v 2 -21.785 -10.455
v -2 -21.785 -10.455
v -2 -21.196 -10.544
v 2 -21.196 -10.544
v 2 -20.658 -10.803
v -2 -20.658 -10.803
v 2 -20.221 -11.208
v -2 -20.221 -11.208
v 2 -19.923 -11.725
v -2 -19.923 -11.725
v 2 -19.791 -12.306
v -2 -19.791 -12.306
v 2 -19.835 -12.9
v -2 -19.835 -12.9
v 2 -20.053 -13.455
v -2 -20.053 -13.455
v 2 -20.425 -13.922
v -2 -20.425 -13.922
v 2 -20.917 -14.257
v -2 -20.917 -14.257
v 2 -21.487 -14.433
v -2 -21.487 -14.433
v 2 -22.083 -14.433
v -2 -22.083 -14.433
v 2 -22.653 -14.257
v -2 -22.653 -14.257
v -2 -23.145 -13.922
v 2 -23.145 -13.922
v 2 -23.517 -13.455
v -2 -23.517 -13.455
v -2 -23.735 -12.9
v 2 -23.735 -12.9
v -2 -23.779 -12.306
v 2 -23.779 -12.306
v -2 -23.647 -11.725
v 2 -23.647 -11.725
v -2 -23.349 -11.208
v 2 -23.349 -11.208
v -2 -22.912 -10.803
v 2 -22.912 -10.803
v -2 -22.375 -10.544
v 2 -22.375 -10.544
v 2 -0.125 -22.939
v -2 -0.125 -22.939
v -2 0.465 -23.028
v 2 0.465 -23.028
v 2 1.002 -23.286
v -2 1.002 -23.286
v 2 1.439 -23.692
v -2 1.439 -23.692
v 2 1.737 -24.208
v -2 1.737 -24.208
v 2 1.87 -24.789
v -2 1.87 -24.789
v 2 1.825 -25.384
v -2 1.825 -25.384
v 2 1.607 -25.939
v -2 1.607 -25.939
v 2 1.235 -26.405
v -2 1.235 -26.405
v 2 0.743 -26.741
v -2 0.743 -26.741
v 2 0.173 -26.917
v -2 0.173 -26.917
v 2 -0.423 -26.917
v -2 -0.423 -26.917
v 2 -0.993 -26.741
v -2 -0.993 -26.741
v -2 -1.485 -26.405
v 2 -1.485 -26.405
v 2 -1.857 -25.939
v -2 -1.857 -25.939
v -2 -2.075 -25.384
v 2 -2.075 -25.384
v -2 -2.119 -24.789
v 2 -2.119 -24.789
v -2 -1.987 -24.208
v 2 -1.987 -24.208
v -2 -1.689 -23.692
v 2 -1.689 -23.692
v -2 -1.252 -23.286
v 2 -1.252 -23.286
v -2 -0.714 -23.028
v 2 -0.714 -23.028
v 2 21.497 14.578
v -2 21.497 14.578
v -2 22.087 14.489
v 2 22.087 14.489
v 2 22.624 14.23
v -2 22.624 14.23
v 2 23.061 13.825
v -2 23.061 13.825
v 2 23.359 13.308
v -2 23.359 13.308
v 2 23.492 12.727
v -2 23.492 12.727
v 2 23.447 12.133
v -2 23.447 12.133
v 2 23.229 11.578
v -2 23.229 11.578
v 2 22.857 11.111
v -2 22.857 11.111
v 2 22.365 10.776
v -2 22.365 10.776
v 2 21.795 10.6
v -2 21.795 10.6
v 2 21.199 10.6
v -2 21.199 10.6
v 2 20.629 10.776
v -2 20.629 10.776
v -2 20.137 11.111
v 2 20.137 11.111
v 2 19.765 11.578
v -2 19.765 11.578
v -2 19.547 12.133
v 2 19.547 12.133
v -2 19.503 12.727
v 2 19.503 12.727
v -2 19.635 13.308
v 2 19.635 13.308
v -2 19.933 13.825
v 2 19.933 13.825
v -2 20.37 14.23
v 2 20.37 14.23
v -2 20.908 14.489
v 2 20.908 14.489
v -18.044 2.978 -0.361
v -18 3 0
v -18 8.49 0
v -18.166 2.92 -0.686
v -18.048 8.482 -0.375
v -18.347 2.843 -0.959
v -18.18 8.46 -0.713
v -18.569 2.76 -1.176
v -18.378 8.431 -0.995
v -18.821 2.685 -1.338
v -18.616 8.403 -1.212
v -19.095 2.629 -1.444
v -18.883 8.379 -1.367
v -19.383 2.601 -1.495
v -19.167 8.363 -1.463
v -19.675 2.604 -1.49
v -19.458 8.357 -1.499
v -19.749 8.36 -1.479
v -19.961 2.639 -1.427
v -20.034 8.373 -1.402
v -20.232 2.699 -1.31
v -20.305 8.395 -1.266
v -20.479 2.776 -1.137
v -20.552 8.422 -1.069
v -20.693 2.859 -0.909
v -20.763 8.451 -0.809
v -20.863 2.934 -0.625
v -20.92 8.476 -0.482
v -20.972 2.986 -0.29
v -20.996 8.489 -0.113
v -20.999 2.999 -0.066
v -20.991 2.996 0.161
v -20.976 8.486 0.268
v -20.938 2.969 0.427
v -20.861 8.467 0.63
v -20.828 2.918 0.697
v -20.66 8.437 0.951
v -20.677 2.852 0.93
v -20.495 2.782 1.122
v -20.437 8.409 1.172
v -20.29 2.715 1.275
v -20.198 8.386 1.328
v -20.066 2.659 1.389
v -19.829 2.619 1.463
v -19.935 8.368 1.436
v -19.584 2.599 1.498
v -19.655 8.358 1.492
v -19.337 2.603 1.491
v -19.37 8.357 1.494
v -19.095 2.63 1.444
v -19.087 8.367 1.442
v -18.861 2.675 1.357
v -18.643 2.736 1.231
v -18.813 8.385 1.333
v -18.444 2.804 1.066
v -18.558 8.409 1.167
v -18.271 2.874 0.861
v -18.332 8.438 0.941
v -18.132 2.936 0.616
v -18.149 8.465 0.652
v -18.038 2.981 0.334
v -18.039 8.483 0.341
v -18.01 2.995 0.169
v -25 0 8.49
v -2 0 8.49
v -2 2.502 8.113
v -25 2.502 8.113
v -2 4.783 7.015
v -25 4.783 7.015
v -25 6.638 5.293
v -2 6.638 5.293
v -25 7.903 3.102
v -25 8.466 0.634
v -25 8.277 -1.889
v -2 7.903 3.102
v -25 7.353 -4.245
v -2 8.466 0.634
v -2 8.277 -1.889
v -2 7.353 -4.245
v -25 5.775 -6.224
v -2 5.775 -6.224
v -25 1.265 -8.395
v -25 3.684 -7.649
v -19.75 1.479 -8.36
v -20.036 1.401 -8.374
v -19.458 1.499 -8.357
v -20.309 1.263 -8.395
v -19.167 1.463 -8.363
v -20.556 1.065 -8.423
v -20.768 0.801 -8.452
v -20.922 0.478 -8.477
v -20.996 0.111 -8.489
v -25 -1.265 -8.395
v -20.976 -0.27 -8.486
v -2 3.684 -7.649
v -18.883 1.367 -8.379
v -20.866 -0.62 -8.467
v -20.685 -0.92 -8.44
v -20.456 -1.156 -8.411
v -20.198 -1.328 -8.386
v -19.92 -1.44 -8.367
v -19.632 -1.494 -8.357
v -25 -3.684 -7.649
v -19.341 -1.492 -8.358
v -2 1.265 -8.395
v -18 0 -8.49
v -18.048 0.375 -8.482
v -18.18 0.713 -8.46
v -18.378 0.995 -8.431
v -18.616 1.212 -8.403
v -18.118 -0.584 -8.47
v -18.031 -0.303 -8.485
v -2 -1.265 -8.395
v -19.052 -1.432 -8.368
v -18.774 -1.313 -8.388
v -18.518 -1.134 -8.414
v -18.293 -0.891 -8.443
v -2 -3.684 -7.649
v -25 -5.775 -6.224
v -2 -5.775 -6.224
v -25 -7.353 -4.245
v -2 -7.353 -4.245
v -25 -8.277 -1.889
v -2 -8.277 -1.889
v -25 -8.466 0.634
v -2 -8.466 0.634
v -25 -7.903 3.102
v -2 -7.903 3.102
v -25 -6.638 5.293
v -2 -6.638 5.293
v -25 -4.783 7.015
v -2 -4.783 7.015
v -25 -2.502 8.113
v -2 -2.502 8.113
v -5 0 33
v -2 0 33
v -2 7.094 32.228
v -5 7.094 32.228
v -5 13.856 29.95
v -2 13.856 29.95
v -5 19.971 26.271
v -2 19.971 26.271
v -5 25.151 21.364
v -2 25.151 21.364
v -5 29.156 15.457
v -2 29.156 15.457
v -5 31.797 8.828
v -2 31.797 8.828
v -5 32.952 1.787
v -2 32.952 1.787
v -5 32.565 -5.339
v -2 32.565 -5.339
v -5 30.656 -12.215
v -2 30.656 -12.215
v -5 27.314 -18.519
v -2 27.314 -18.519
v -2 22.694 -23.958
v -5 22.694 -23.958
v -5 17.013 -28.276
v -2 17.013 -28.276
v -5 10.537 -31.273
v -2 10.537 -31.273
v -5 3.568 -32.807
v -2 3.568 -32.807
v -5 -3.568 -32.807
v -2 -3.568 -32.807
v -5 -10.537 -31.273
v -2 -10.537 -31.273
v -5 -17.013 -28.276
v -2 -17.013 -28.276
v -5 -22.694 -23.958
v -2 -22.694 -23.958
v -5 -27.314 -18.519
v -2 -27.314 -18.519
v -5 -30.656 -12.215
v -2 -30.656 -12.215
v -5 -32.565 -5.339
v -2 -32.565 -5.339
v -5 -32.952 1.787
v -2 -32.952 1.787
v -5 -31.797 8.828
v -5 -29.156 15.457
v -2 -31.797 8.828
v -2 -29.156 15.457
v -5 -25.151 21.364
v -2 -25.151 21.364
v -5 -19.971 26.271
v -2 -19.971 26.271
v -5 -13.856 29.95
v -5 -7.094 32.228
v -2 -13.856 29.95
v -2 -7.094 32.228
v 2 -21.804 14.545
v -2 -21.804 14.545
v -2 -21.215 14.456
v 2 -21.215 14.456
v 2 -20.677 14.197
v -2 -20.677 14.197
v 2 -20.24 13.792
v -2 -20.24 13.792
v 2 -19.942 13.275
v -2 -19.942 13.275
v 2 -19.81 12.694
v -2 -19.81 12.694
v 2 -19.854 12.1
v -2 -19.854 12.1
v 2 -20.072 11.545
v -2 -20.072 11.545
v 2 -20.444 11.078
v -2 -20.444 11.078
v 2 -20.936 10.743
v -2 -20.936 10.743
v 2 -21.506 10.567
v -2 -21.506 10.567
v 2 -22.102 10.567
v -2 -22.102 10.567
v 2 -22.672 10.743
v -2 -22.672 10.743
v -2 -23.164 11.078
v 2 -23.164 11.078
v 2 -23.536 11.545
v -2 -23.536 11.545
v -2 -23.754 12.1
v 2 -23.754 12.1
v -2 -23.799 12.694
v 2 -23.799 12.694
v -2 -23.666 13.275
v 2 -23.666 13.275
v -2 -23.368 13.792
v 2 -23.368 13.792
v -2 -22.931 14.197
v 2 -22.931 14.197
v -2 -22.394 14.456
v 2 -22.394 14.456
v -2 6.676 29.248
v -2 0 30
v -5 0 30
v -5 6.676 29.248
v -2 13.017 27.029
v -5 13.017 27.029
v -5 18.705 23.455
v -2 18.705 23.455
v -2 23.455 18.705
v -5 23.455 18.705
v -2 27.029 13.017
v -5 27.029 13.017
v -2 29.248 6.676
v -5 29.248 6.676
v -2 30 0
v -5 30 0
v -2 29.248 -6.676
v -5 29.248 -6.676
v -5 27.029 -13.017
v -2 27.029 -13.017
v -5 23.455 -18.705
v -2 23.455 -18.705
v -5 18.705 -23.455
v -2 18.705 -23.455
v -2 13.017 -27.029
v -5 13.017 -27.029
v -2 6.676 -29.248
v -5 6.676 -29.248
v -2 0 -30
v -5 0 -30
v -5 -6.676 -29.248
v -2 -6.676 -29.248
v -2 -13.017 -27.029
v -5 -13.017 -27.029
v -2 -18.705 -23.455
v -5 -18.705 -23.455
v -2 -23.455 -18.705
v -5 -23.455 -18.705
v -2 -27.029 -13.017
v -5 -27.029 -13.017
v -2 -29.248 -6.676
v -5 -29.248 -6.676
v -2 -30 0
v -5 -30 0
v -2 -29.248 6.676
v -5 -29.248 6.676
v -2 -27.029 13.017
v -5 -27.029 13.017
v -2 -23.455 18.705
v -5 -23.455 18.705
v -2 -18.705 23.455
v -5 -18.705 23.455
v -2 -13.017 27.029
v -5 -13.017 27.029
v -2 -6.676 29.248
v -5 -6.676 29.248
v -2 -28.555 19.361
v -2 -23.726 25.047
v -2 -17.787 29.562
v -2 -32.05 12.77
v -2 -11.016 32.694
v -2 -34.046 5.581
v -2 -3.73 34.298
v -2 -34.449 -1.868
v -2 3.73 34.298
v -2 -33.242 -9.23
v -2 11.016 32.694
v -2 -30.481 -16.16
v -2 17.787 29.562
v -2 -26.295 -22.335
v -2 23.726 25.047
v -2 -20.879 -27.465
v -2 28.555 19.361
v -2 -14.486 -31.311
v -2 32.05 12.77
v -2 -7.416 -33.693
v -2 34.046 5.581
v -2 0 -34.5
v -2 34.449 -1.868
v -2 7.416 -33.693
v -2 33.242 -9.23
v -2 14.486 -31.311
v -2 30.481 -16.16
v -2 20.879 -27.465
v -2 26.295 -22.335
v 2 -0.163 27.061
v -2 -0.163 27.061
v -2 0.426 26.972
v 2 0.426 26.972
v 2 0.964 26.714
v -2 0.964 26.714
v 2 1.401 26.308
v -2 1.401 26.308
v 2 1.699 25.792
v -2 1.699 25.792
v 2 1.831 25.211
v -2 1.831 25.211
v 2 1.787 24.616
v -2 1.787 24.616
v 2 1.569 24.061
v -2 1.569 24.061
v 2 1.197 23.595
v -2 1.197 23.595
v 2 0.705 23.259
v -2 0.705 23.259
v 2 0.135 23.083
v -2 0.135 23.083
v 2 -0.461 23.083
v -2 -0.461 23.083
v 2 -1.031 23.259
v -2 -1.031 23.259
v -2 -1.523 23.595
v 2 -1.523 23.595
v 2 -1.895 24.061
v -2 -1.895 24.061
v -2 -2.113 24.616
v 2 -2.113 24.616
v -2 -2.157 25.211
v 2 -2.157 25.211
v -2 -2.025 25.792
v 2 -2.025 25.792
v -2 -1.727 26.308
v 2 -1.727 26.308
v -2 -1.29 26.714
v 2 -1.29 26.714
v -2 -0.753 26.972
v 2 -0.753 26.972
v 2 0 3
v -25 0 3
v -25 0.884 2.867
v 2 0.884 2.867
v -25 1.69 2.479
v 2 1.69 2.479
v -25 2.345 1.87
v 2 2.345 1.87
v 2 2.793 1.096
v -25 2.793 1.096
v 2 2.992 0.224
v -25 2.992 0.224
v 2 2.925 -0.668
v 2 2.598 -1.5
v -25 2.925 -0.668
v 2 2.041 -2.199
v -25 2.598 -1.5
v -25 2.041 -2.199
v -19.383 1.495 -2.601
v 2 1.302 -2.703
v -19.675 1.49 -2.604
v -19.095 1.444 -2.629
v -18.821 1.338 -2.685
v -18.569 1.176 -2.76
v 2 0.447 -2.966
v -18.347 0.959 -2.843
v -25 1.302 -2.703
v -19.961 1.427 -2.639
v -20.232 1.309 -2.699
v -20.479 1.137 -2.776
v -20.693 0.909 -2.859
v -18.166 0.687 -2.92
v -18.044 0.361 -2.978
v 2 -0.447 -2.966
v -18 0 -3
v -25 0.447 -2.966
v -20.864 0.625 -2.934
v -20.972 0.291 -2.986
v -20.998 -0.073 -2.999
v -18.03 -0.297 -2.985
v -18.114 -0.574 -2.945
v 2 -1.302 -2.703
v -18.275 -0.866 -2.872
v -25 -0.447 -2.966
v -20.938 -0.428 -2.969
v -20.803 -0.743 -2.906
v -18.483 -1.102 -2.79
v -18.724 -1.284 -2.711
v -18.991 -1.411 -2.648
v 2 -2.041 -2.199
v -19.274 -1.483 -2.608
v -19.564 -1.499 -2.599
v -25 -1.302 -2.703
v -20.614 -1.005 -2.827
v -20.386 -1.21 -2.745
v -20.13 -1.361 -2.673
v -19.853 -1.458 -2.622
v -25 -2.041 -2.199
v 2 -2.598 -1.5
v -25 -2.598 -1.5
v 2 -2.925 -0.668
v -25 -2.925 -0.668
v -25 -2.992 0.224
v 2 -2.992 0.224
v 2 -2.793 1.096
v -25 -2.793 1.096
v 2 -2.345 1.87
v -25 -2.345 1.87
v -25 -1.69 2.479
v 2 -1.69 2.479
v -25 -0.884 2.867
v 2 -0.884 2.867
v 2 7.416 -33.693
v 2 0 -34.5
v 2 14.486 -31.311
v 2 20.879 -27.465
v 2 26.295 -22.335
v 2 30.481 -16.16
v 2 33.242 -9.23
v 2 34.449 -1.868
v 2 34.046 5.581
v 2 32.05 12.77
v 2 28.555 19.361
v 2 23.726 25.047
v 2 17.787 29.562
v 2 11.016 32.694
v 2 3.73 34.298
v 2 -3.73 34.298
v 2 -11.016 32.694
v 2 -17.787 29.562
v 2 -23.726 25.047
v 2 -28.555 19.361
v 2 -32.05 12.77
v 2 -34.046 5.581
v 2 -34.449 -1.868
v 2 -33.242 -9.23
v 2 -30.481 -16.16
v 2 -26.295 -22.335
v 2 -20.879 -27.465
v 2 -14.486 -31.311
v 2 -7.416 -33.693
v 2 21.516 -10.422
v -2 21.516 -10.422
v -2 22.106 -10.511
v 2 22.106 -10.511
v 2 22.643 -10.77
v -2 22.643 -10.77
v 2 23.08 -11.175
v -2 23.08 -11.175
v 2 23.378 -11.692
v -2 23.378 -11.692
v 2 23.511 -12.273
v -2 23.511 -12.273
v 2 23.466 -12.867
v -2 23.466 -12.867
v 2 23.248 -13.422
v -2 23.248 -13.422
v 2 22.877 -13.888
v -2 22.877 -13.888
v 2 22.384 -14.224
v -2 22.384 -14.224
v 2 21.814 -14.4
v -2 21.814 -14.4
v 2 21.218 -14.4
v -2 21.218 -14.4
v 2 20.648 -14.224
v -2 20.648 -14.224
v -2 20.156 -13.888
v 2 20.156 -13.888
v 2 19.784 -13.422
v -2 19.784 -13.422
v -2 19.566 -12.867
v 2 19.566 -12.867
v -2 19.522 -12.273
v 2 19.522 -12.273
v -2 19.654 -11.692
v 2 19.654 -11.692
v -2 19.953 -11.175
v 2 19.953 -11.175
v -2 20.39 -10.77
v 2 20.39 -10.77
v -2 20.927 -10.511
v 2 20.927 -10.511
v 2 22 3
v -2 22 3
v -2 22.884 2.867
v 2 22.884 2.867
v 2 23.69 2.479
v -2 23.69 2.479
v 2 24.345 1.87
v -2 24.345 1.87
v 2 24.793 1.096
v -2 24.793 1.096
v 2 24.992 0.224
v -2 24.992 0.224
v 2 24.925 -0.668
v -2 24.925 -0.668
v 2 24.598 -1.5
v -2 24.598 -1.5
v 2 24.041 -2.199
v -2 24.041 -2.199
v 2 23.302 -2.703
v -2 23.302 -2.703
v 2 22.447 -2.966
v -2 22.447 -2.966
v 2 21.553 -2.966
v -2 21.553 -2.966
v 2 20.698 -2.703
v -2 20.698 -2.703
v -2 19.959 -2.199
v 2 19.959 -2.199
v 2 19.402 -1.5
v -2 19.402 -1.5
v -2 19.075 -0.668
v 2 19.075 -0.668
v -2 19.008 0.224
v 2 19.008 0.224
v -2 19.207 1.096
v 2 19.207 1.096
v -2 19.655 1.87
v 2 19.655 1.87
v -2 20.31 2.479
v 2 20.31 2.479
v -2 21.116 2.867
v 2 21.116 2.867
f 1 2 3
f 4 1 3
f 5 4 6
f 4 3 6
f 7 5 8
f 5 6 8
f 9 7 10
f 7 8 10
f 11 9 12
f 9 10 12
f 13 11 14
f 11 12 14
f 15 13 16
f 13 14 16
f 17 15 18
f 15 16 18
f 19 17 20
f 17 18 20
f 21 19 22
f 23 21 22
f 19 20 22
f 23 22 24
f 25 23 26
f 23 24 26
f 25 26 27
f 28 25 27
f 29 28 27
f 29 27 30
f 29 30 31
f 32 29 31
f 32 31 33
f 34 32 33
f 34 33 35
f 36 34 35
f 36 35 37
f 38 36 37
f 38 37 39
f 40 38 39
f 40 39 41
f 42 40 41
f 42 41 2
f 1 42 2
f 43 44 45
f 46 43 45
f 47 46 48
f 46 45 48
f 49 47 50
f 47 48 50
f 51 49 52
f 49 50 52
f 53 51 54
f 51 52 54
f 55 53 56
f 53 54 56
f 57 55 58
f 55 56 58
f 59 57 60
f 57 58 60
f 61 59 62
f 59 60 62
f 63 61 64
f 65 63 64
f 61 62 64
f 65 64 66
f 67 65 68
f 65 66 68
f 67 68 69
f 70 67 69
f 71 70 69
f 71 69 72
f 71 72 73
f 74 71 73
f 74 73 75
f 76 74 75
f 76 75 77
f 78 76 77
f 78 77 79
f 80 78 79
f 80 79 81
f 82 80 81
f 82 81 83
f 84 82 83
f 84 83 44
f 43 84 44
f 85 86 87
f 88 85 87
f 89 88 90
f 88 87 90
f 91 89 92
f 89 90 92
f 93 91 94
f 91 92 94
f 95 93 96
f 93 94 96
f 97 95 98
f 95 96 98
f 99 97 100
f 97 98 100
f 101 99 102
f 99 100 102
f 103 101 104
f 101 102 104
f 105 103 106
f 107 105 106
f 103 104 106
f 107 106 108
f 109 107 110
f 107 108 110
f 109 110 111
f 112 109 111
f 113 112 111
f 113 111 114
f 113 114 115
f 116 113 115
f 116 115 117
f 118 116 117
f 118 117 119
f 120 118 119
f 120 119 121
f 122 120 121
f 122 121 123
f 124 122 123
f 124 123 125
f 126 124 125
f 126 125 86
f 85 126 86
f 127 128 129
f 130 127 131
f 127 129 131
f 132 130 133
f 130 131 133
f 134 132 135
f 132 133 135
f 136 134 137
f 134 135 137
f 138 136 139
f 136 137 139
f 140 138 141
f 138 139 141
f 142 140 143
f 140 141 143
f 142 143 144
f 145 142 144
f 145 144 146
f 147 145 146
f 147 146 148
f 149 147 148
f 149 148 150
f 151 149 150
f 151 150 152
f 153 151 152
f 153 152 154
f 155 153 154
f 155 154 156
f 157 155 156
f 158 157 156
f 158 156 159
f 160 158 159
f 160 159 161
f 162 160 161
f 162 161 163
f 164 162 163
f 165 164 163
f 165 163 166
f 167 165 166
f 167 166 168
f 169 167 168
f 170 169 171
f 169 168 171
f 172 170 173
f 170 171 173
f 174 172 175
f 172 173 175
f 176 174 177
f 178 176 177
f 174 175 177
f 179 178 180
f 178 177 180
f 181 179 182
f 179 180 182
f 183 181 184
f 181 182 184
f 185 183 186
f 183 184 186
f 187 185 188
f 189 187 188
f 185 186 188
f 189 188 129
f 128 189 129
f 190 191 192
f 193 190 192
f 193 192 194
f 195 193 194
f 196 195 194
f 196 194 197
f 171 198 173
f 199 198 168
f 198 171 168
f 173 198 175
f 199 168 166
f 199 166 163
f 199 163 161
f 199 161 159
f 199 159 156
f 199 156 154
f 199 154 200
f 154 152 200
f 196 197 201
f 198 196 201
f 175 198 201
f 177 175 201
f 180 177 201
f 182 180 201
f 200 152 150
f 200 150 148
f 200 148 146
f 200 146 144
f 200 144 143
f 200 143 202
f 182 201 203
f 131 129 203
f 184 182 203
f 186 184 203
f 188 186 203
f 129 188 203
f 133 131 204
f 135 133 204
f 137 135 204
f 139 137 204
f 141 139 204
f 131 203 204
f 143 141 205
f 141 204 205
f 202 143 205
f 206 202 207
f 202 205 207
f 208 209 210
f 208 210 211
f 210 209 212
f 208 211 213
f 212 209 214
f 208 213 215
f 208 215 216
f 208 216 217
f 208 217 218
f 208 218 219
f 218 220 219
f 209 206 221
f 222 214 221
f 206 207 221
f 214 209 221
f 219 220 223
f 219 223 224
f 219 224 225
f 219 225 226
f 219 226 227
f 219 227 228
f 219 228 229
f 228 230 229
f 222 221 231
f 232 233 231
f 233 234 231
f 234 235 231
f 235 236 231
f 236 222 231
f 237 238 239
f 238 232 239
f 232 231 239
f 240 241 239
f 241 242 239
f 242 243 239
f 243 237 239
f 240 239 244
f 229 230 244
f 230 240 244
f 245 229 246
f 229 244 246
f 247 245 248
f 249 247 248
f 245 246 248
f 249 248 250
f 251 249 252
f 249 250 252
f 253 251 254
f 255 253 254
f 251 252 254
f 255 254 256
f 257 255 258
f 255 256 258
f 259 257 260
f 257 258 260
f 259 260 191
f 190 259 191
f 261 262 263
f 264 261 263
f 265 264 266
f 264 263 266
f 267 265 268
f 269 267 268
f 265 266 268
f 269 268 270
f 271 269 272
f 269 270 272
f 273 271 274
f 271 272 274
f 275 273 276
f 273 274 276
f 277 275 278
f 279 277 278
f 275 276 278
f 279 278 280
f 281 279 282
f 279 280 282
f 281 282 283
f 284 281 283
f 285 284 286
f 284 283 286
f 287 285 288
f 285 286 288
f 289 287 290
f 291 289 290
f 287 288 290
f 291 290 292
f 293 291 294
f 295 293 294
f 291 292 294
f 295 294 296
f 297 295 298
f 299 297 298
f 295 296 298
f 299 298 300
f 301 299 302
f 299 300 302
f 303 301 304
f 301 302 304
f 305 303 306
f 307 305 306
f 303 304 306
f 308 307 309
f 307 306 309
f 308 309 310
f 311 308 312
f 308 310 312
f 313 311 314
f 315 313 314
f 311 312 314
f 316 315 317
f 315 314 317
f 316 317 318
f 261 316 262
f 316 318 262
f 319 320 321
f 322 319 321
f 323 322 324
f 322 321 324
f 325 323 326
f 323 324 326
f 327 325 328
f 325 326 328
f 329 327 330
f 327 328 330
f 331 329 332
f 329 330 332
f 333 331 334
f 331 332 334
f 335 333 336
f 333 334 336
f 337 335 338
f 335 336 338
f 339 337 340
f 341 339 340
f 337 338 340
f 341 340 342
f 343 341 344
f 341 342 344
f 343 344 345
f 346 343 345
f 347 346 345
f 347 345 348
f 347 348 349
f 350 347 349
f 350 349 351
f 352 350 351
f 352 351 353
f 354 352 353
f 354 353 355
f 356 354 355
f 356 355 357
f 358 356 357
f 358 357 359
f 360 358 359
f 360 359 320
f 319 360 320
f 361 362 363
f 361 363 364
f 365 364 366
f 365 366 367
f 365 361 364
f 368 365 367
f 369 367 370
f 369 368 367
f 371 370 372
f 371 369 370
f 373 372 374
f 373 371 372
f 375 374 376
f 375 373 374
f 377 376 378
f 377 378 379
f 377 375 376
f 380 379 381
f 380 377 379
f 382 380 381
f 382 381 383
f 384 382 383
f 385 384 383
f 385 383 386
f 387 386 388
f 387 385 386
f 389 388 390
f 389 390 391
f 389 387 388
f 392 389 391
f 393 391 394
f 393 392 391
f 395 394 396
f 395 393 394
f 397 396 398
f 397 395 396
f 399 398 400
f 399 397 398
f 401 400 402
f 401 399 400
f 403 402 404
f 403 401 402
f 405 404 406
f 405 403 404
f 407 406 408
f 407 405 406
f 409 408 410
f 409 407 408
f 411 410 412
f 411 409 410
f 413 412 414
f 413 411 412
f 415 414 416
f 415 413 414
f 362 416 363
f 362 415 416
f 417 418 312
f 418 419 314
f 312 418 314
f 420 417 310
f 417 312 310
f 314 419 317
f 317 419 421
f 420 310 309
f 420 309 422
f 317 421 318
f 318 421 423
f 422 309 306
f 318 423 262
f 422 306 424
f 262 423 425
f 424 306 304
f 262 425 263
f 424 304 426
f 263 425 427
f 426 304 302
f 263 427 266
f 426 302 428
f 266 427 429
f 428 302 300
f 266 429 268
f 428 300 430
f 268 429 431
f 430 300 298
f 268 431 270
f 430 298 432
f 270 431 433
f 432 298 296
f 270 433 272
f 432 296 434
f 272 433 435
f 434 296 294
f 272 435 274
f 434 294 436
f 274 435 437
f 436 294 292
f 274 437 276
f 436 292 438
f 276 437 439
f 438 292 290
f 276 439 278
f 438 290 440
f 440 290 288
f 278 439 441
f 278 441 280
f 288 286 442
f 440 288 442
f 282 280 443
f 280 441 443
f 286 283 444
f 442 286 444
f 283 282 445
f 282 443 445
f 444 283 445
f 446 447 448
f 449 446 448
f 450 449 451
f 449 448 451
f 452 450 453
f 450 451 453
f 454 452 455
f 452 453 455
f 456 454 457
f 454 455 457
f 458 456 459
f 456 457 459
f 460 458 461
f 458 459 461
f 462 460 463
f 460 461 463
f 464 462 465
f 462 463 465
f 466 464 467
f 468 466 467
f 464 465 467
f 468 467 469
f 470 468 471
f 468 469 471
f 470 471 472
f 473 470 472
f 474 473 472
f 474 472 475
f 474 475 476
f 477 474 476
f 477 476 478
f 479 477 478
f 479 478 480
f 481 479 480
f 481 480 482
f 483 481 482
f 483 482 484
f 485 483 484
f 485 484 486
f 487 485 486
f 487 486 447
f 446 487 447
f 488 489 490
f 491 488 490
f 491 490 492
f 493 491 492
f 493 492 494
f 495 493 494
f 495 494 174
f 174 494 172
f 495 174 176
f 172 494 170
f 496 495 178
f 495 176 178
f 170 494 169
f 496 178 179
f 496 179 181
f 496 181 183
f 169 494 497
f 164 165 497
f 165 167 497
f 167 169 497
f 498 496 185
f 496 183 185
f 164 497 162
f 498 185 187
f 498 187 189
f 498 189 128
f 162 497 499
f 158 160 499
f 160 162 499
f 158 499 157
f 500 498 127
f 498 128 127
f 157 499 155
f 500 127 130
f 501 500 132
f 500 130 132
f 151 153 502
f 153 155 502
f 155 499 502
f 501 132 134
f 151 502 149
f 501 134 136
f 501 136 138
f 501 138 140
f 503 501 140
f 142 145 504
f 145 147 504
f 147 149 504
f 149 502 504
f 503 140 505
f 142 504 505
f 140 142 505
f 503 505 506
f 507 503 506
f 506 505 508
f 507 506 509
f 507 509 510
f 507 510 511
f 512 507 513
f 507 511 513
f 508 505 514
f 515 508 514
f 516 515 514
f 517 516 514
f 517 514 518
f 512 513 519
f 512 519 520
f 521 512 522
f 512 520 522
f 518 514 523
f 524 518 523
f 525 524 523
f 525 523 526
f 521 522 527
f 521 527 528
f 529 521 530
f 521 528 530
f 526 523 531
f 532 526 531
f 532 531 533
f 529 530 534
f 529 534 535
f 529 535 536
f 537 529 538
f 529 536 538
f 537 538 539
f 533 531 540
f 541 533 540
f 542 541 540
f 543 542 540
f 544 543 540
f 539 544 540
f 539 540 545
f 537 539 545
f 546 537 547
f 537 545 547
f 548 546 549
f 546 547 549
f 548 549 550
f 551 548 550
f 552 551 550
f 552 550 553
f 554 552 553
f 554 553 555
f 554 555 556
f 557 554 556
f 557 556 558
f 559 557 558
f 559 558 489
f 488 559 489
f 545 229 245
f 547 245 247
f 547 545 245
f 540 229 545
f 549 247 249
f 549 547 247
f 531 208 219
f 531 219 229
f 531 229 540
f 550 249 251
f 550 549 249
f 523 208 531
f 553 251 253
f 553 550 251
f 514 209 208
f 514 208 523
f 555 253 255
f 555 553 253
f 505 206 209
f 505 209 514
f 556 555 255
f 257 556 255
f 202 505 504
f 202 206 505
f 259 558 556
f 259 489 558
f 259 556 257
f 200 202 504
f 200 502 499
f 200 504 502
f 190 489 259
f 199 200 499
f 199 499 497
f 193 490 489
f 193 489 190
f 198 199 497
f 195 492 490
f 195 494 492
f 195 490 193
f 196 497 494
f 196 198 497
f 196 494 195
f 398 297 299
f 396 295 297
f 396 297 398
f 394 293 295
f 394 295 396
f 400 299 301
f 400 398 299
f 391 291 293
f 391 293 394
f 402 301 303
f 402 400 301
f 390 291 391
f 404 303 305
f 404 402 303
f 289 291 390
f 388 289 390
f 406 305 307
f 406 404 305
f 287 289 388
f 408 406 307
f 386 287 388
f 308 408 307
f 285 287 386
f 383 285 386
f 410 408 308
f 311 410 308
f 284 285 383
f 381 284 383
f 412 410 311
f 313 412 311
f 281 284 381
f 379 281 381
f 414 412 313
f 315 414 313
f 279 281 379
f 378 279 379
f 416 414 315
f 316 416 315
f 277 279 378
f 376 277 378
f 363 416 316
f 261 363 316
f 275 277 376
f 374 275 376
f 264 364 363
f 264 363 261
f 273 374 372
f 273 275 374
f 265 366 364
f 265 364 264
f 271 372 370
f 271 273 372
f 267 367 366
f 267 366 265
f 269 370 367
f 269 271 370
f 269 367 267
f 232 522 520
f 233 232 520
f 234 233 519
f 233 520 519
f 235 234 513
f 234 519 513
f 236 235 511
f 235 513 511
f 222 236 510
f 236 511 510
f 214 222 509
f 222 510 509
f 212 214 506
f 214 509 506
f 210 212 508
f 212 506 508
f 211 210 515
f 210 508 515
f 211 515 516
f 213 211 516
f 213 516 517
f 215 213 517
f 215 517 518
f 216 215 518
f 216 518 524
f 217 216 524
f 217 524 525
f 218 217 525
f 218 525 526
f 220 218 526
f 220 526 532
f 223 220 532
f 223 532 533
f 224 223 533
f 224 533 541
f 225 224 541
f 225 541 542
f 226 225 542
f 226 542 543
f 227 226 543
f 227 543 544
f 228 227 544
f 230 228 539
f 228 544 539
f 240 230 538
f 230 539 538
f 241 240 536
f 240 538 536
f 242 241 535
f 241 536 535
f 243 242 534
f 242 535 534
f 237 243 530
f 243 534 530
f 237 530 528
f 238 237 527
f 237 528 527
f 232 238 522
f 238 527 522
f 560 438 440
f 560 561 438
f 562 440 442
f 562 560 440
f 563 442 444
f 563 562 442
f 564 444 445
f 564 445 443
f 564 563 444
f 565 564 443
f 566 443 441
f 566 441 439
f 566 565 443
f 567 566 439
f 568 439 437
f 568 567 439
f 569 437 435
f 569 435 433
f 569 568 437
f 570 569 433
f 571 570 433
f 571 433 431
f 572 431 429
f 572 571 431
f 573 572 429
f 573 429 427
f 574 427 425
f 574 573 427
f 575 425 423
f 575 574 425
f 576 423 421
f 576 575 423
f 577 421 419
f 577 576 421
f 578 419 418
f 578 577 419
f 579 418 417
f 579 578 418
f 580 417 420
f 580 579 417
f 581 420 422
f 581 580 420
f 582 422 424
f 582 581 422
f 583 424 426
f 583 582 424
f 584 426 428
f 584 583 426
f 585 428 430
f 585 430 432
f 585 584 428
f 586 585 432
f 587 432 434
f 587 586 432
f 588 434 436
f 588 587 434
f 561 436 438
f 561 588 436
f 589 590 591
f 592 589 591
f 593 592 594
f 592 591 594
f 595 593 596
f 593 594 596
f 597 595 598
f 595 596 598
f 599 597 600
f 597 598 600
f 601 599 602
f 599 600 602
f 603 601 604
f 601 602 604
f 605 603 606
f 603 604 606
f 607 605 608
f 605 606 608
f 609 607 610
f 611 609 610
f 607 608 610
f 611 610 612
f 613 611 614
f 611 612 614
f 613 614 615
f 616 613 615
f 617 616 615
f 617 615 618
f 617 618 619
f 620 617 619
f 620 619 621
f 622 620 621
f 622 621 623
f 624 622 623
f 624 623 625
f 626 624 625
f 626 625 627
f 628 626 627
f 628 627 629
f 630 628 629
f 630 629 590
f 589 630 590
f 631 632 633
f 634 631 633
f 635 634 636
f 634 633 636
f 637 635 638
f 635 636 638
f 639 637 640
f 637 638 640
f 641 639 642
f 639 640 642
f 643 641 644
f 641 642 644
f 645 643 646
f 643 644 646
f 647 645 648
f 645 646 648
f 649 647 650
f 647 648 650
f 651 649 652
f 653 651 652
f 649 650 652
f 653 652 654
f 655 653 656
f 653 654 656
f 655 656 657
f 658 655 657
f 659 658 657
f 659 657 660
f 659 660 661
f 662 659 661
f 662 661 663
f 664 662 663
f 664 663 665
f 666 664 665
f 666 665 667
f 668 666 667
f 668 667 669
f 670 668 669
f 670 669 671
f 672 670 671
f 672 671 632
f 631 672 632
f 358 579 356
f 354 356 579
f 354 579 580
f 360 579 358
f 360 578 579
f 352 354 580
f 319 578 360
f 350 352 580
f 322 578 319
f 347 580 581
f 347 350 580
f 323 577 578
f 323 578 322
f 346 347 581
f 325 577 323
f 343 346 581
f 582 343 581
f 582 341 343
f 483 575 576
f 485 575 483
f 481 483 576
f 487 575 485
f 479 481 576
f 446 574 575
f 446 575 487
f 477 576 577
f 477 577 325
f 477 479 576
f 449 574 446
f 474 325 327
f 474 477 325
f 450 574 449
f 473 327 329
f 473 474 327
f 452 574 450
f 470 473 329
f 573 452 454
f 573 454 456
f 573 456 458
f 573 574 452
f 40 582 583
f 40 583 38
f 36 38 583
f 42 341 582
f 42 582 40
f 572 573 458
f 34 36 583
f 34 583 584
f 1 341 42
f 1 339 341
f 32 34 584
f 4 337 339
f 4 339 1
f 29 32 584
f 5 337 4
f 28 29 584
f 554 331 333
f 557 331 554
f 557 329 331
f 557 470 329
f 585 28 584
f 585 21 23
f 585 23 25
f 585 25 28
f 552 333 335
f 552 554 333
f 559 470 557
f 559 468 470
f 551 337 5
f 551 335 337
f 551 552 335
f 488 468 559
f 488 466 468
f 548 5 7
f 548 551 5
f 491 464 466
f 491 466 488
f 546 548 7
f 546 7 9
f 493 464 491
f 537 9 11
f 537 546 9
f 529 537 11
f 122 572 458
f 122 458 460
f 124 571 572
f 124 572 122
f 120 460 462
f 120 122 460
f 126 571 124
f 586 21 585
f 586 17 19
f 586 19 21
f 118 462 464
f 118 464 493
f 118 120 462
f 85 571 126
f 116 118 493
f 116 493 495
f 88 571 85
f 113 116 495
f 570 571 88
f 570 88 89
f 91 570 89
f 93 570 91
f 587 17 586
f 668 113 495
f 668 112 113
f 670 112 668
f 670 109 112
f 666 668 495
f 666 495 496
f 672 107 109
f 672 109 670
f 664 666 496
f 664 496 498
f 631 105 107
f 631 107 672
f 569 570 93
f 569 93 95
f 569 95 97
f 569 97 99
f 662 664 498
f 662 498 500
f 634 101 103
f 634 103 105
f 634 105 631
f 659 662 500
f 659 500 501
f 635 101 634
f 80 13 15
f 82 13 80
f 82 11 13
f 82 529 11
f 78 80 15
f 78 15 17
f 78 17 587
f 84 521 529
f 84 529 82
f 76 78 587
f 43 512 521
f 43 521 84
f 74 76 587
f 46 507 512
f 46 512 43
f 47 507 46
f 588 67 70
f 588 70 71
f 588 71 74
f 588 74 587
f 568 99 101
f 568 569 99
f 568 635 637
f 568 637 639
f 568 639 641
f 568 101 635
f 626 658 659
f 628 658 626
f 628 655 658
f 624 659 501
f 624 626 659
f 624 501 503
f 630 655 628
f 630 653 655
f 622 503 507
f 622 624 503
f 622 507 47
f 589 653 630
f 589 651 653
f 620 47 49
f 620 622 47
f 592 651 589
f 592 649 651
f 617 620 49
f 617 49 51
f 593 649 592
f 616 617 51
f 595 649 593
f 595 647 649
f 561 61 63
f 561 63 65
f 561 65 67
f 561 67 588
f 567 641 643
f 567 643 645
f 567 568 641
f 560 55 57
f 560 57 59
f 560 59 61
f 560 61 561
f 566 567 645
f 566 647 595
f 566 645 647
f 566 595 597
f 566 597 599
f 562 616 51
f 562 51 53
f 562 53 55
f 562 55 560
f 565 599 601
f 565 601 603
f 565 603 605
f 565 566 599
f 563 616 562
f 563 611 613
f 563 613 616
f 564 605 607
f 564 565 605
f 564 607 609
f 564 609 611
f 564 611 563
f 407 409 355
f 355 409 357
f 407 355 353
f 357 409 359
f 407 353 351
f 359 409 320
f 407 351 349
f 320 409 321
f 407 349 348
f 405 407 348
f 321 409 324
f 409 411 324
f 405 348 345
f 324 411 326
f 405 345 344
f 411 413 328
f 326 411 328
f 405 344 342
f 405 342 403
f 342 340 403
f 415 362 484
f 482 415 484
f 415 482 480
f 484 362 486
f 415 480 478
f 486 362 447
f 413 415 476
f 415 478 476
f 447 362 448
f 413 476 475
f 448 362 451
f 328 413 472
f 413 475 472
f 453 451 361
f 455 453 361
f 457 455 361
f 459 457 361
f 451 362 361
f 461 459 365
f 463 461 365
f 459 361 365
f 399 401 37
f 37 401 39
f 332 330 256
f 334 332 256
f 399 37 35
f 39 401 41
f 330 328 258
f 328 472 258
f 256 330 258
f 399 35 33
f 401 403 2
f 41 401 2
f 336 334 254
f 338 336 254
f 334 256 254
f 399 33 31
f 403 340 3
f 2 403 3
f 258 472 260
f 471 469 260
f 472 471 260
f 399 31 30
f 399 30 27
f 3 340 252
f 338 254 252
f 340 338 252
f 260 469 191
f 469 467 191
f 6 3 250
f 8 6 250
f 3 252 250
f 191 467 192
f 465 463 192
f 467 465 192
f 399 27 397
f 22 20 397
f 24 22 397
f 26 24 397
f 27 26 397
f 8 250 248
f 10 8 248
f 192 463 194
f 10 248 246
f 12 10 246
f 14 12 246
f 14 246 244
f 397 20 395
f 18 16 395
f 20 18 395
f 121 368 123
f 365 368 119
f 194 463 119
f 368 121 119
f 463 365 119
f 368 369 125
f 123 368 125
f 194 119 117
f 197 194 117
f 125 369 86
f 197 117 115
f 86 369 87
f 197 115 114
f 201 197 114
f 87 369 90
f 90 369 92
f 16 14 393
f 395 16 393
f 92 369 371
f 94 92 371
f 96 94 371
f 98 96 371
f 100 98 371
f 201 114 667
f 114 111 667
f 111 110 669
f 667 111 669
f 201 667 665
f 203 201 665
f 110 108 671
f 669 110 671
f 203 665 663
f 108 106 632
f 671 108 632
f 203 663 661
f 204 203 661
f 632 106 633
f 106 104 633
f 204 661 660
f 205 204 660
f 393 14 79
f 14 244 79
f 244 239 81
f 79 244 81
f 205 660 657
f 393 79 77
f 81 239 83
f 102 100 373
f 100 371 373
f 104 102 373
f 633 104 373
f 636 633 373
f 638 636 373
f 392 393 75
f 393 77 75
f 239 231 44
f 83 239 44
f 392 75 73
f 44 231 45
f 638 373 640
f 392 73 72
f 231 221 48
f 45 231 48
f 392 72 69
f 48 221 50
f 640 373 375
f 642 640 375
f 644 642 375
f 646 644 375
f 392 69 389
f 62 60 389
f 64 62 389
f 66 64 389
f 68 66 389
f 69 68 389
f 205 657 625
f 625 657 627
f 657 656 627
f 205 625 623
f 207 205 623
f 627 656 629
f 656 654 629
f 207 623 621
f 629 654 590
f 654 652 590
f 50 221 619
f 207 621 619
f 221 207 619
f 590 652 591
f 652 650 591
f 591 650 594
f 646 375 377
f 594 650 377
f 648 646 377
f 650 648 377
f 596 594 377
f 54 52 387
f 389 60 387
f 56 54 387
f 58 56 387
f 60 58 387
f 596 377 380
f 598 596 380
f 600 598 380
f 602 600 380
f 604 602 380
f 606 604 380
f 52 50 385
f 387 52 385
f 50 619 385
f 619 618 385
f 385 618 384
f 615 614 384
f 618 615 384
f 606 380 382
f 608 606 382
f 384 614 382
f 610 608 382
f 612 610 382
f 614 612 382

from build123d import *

# Parameters (mm, degrees)
SKETCH1_R           = 34.5
BOSS_EXTRUDE1_DEPTH = 2
SKETCH2_R           = 8.49
BOSS_EXTRUDE2_DEPTH = 23
SKETCH4_R           = 3
CUT_EXTRUDE1_DEPTH  = 30
CUT_EXTRUDE2_REACH  = 45
SKETCH5_R           = 1.5
CUT_EXTRUDE3_REACH  = 36.5
SKETCH6_R           = 1.5
SKETCH19_R          = 33
SKETCH19_R_2        = 30
BOSS_EXTRUDE5_DEPTH = 3
SKETCH21_R          = 3
CUT_EXTRUDE6_DEPTH  = 10
SKETCH20_R          = 2
CUT_EXTRUDE7_DEPTH  = 10


with BuildPart() as part:
    # Sketch1 → Boss-Extrude1 (new body, symmetric)
    with BuildSketch(Plane(origin=(0, 0, 0), x_dir=(0, 0, -1), z_dir=(1, 0, 0))):
        Circle(SKETCH1_R)
    extrude(amount=BOSS_EXTRUDE1_DEPTH, both=True)

    # Sketch2 → Boss-Extrude2 (add)
    with BuildSketch(Plane.ZY.offset(2)):
        Circle(SKETCH2_R)
    extrude(amount=BOSS_EXTRUDE2_DEPTH)

    # Sketch4 → Cut-Extrude1 (cut)
    with BuildSketch(Plane.ZY.offset(25)):
        Circle(SKETCH4_R)
    extrude(amount=-CUT_EXTRUDE1_DEPTH, mode=Mode.SUBTRACT)

    # Sketch5 → Cut-Extrude2 (cut, up to next)
    with BuildSketch(Plane(origin=(0, 8.5, 0), x_dir=(1, 0, 0), z_dir=(0, 1, 0)), mode=Mode.PRIVATE) as cut_extrude2_sk1:
        with Locations((-19.5, 0)):
            Circle(SKETCH5_R)
    cut_extrude2_tool1 = extrude(cut_extrude2_sk1.sketch, amount=-CUT_EXTRUDE2_REACH, mode=Mode.PRIVATE) & part.part
    add(cut_extrude2_tool1.solids().sort_by_distance((-19.5, 8.5, 0))[0], mode=Mode.SUBTRACT)

    # Sketch6 → Cut-Extrude3 (cut, up to next)
    with BuildSketch(Plane.XY, mode=Mode.PRIVATE) as cut_extrude3_sk1:
        with Locations((-19.5, 0)):
            Circle(SKETCH6_R)
    cut_extrude3_tool1 = extrude(cut_extrude3_sk1.sketch, amount=-CUT_EXTRUDE3_REACH, mode=Mode.PRIVATE) & part.part
    add(cut_extrude3_tool1.solids().sort_by_distance((-19.5, 0, 0))[0], mode=Mode.SUBTRACT)

    # Sketch19 → Boss-Extrude5 (add)
    with BuildSketch(Plane.ZY.offset(2)):
        Circle(SKETCH19_R)
        Circle(SKETCH19_R_2, mode=Mode.SUBTRACT)
    extrude(amount=BOSS_EXTRUDE5_DEPTH)

    # Sketch21 → Cut-Extrude6 (cut)
    with BuildSketch(Plane.ZY.offset(2)):
        with Locations((0, 22)):
            Circle(SKETCH21_R)
    extrude(amount=-CUT_EXTRUDE6_DEPTH, mode=Mode.SUBTRACT)

    # Sketch20 → Cut-Extrude7 (cut)
    with BuildSketch(Plane.ZY.offset(2)):
        with Locations((-12.422389037, 21.516208963)):
            Circle(SKETCH20_R)
        with Locations((12.577603677, 21.497122149)):
            Circle(SKETCH20_R)
        with Locations((25.061070367, -0.163050043)):
            Circle(SKETCH20_R)
        with Locations((12.544544344, -21.804135421)):
            Circle(SKETCH20_R)
        with Locations((-12.45544837, -21.785048606)):
            Circle(SKETCH20_R)
        with Locations((-24.93891506, -0.124876414)):
            Circle(SKETCH20_R)
    extrude(amount=-CUT_EXTRUDE7_DEPTH, mode=Mode.SUBTRACT)


solid = part.part
